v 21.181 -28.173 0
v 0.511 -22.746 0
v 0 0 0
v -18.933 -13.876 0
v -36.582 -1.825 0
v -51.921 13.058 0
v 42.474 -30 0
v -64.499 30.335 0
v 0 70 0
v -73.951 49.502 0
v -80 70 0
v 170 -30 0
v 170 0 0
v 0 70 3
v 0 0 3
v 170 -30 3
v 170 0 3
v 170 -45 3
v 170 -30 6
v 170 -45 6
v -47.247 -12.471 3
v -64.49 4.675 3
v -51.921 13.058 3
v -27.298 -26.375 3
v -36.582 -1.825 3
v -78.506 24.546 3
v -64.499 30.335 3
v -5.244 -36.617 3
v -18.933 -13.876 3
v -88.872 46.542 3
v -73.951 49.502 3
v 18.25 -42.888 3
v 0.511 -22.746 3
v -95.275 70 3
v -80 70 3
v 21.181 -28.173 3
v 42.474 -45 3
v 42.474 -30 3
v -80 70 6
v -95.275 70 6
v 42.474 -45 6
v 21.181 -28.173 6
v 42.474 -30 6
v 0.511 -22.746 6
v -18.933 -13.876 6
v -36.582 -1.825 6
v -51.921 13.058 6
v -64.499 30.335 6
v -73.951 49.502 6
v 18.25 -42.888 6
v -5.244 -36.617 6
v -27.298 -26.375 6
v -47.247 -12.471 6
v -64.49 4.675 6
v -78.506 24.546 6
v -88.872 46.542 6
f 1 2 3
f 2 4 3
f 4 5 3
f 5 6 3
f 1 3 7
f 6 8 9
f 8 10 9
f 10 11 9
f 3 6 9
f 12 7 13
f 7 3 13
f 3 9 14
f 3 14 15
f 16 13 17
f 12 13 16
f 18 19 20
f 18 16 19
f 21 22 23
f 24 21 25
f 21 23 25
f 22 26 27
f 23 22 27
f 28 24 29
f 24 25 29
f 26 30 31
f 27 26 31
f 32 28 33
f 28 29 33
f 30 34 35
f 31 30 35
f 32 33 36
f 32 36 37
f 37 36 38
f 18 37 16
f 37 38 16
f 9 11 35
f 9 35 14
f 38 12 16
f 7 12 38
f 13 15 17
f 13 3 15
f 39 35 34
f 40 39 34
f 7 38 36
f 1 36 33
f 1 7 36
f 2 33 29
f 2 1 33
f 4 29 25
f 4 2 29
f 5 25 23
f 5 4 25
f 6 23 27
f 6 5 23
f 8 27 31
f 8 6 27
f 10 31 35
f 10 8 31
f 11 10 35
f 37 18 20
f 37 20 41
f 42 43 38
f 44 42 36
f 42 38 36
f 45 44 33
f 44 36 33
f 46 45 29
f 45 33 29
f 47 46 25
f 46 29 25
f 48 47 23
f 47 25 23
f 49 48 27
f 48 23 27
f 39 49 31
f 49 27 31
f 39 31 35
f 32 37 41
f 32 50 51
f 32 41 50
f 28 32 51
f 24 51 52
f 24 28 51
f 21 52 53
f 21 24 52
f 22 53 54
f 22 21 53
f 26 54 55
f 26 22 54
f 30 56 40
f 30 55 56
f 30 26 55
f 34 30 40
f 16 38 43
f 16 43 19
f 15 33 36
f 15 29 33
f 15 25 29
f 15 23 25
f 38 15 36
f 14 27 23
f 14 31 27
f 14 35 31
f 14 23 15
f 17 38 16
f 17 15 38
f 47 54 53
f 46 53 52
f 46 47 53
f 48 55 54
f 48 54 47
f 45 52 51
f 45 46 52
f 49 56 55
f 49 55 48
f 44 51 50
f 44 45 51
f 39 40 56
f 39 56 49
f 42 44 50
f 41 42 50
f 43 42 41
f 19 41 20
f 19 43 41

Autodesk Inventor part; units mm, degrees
ref_plane "YZ Plane" through (0, 0, 0) normal (1, 0, 0) x (0, 1, 0)
ref_plane "XZ Plane" through (0, 0, 0) normal (0, 1, 0) x (-1, 0, 0)
ref_plane "XY Plane" through (0, 0, 0) normal (0, 0, 1) x (1, 0, 0)
sketch "Sketch2" plane through (0, 0, 0) normal (0, 0, 1) x (1, 0, 0)
  line L0 (0, 0) -> (170, 0)
  line L1 (0, 70) -> (0, 0)
  line L2 (170, 0) -> (170, -30)
  line L3 (170, -30) -> (-80, -30)
  line L4 (-80, 70) -> (0, 70)
  line L5 (-80, 70) -> (-80, -30)
  dimension "d2" = 30
  dimension "d5" = 70
  dimension "d9" = 80
  dimension "d10" = 250
extrude "Extrusion1" add sketch "Sketch2" along normal blind 3
fillet "Fillet1" radius 125 1 edges at (-80, -30, 1.5)
sketch "Sketch3" plane through (0, 0, 3) normal (0, 0, 1) x (1, 0, 0)
  arc A0 (-80, 70) -> (42.4745, -30) centre (42.4745, 95) ccw projected
  arc A1 (-95.2753, 70) -> (42.4745, -45) centre (42.4745, 95) ccw
  line L0 (170, -30) -> (170, -45)
  line L1 (-80, 70) -> (-95.2753, 70)
  line L2 (0, 70) -> (-80, 70) projected
  line L3 (170, -45) -> (42.4745, -45)
  line L4 (42.4745, -30) -> (170, -30) projected
  arc A2 (-80, 70) -> (42.4745, -30) centre (42.4745, 95) ccw
  line L5 (170, -30) -> (42.4745, -30)
  line L6 (170, -30) -> (170, 0) projected
  point P0 (0, 0)
  dimension "d12" = 280
extrude "Extrusion2" add sketch "Sketch3" along normal blind 3
properties part number "Arm-X25-Left-Back"
